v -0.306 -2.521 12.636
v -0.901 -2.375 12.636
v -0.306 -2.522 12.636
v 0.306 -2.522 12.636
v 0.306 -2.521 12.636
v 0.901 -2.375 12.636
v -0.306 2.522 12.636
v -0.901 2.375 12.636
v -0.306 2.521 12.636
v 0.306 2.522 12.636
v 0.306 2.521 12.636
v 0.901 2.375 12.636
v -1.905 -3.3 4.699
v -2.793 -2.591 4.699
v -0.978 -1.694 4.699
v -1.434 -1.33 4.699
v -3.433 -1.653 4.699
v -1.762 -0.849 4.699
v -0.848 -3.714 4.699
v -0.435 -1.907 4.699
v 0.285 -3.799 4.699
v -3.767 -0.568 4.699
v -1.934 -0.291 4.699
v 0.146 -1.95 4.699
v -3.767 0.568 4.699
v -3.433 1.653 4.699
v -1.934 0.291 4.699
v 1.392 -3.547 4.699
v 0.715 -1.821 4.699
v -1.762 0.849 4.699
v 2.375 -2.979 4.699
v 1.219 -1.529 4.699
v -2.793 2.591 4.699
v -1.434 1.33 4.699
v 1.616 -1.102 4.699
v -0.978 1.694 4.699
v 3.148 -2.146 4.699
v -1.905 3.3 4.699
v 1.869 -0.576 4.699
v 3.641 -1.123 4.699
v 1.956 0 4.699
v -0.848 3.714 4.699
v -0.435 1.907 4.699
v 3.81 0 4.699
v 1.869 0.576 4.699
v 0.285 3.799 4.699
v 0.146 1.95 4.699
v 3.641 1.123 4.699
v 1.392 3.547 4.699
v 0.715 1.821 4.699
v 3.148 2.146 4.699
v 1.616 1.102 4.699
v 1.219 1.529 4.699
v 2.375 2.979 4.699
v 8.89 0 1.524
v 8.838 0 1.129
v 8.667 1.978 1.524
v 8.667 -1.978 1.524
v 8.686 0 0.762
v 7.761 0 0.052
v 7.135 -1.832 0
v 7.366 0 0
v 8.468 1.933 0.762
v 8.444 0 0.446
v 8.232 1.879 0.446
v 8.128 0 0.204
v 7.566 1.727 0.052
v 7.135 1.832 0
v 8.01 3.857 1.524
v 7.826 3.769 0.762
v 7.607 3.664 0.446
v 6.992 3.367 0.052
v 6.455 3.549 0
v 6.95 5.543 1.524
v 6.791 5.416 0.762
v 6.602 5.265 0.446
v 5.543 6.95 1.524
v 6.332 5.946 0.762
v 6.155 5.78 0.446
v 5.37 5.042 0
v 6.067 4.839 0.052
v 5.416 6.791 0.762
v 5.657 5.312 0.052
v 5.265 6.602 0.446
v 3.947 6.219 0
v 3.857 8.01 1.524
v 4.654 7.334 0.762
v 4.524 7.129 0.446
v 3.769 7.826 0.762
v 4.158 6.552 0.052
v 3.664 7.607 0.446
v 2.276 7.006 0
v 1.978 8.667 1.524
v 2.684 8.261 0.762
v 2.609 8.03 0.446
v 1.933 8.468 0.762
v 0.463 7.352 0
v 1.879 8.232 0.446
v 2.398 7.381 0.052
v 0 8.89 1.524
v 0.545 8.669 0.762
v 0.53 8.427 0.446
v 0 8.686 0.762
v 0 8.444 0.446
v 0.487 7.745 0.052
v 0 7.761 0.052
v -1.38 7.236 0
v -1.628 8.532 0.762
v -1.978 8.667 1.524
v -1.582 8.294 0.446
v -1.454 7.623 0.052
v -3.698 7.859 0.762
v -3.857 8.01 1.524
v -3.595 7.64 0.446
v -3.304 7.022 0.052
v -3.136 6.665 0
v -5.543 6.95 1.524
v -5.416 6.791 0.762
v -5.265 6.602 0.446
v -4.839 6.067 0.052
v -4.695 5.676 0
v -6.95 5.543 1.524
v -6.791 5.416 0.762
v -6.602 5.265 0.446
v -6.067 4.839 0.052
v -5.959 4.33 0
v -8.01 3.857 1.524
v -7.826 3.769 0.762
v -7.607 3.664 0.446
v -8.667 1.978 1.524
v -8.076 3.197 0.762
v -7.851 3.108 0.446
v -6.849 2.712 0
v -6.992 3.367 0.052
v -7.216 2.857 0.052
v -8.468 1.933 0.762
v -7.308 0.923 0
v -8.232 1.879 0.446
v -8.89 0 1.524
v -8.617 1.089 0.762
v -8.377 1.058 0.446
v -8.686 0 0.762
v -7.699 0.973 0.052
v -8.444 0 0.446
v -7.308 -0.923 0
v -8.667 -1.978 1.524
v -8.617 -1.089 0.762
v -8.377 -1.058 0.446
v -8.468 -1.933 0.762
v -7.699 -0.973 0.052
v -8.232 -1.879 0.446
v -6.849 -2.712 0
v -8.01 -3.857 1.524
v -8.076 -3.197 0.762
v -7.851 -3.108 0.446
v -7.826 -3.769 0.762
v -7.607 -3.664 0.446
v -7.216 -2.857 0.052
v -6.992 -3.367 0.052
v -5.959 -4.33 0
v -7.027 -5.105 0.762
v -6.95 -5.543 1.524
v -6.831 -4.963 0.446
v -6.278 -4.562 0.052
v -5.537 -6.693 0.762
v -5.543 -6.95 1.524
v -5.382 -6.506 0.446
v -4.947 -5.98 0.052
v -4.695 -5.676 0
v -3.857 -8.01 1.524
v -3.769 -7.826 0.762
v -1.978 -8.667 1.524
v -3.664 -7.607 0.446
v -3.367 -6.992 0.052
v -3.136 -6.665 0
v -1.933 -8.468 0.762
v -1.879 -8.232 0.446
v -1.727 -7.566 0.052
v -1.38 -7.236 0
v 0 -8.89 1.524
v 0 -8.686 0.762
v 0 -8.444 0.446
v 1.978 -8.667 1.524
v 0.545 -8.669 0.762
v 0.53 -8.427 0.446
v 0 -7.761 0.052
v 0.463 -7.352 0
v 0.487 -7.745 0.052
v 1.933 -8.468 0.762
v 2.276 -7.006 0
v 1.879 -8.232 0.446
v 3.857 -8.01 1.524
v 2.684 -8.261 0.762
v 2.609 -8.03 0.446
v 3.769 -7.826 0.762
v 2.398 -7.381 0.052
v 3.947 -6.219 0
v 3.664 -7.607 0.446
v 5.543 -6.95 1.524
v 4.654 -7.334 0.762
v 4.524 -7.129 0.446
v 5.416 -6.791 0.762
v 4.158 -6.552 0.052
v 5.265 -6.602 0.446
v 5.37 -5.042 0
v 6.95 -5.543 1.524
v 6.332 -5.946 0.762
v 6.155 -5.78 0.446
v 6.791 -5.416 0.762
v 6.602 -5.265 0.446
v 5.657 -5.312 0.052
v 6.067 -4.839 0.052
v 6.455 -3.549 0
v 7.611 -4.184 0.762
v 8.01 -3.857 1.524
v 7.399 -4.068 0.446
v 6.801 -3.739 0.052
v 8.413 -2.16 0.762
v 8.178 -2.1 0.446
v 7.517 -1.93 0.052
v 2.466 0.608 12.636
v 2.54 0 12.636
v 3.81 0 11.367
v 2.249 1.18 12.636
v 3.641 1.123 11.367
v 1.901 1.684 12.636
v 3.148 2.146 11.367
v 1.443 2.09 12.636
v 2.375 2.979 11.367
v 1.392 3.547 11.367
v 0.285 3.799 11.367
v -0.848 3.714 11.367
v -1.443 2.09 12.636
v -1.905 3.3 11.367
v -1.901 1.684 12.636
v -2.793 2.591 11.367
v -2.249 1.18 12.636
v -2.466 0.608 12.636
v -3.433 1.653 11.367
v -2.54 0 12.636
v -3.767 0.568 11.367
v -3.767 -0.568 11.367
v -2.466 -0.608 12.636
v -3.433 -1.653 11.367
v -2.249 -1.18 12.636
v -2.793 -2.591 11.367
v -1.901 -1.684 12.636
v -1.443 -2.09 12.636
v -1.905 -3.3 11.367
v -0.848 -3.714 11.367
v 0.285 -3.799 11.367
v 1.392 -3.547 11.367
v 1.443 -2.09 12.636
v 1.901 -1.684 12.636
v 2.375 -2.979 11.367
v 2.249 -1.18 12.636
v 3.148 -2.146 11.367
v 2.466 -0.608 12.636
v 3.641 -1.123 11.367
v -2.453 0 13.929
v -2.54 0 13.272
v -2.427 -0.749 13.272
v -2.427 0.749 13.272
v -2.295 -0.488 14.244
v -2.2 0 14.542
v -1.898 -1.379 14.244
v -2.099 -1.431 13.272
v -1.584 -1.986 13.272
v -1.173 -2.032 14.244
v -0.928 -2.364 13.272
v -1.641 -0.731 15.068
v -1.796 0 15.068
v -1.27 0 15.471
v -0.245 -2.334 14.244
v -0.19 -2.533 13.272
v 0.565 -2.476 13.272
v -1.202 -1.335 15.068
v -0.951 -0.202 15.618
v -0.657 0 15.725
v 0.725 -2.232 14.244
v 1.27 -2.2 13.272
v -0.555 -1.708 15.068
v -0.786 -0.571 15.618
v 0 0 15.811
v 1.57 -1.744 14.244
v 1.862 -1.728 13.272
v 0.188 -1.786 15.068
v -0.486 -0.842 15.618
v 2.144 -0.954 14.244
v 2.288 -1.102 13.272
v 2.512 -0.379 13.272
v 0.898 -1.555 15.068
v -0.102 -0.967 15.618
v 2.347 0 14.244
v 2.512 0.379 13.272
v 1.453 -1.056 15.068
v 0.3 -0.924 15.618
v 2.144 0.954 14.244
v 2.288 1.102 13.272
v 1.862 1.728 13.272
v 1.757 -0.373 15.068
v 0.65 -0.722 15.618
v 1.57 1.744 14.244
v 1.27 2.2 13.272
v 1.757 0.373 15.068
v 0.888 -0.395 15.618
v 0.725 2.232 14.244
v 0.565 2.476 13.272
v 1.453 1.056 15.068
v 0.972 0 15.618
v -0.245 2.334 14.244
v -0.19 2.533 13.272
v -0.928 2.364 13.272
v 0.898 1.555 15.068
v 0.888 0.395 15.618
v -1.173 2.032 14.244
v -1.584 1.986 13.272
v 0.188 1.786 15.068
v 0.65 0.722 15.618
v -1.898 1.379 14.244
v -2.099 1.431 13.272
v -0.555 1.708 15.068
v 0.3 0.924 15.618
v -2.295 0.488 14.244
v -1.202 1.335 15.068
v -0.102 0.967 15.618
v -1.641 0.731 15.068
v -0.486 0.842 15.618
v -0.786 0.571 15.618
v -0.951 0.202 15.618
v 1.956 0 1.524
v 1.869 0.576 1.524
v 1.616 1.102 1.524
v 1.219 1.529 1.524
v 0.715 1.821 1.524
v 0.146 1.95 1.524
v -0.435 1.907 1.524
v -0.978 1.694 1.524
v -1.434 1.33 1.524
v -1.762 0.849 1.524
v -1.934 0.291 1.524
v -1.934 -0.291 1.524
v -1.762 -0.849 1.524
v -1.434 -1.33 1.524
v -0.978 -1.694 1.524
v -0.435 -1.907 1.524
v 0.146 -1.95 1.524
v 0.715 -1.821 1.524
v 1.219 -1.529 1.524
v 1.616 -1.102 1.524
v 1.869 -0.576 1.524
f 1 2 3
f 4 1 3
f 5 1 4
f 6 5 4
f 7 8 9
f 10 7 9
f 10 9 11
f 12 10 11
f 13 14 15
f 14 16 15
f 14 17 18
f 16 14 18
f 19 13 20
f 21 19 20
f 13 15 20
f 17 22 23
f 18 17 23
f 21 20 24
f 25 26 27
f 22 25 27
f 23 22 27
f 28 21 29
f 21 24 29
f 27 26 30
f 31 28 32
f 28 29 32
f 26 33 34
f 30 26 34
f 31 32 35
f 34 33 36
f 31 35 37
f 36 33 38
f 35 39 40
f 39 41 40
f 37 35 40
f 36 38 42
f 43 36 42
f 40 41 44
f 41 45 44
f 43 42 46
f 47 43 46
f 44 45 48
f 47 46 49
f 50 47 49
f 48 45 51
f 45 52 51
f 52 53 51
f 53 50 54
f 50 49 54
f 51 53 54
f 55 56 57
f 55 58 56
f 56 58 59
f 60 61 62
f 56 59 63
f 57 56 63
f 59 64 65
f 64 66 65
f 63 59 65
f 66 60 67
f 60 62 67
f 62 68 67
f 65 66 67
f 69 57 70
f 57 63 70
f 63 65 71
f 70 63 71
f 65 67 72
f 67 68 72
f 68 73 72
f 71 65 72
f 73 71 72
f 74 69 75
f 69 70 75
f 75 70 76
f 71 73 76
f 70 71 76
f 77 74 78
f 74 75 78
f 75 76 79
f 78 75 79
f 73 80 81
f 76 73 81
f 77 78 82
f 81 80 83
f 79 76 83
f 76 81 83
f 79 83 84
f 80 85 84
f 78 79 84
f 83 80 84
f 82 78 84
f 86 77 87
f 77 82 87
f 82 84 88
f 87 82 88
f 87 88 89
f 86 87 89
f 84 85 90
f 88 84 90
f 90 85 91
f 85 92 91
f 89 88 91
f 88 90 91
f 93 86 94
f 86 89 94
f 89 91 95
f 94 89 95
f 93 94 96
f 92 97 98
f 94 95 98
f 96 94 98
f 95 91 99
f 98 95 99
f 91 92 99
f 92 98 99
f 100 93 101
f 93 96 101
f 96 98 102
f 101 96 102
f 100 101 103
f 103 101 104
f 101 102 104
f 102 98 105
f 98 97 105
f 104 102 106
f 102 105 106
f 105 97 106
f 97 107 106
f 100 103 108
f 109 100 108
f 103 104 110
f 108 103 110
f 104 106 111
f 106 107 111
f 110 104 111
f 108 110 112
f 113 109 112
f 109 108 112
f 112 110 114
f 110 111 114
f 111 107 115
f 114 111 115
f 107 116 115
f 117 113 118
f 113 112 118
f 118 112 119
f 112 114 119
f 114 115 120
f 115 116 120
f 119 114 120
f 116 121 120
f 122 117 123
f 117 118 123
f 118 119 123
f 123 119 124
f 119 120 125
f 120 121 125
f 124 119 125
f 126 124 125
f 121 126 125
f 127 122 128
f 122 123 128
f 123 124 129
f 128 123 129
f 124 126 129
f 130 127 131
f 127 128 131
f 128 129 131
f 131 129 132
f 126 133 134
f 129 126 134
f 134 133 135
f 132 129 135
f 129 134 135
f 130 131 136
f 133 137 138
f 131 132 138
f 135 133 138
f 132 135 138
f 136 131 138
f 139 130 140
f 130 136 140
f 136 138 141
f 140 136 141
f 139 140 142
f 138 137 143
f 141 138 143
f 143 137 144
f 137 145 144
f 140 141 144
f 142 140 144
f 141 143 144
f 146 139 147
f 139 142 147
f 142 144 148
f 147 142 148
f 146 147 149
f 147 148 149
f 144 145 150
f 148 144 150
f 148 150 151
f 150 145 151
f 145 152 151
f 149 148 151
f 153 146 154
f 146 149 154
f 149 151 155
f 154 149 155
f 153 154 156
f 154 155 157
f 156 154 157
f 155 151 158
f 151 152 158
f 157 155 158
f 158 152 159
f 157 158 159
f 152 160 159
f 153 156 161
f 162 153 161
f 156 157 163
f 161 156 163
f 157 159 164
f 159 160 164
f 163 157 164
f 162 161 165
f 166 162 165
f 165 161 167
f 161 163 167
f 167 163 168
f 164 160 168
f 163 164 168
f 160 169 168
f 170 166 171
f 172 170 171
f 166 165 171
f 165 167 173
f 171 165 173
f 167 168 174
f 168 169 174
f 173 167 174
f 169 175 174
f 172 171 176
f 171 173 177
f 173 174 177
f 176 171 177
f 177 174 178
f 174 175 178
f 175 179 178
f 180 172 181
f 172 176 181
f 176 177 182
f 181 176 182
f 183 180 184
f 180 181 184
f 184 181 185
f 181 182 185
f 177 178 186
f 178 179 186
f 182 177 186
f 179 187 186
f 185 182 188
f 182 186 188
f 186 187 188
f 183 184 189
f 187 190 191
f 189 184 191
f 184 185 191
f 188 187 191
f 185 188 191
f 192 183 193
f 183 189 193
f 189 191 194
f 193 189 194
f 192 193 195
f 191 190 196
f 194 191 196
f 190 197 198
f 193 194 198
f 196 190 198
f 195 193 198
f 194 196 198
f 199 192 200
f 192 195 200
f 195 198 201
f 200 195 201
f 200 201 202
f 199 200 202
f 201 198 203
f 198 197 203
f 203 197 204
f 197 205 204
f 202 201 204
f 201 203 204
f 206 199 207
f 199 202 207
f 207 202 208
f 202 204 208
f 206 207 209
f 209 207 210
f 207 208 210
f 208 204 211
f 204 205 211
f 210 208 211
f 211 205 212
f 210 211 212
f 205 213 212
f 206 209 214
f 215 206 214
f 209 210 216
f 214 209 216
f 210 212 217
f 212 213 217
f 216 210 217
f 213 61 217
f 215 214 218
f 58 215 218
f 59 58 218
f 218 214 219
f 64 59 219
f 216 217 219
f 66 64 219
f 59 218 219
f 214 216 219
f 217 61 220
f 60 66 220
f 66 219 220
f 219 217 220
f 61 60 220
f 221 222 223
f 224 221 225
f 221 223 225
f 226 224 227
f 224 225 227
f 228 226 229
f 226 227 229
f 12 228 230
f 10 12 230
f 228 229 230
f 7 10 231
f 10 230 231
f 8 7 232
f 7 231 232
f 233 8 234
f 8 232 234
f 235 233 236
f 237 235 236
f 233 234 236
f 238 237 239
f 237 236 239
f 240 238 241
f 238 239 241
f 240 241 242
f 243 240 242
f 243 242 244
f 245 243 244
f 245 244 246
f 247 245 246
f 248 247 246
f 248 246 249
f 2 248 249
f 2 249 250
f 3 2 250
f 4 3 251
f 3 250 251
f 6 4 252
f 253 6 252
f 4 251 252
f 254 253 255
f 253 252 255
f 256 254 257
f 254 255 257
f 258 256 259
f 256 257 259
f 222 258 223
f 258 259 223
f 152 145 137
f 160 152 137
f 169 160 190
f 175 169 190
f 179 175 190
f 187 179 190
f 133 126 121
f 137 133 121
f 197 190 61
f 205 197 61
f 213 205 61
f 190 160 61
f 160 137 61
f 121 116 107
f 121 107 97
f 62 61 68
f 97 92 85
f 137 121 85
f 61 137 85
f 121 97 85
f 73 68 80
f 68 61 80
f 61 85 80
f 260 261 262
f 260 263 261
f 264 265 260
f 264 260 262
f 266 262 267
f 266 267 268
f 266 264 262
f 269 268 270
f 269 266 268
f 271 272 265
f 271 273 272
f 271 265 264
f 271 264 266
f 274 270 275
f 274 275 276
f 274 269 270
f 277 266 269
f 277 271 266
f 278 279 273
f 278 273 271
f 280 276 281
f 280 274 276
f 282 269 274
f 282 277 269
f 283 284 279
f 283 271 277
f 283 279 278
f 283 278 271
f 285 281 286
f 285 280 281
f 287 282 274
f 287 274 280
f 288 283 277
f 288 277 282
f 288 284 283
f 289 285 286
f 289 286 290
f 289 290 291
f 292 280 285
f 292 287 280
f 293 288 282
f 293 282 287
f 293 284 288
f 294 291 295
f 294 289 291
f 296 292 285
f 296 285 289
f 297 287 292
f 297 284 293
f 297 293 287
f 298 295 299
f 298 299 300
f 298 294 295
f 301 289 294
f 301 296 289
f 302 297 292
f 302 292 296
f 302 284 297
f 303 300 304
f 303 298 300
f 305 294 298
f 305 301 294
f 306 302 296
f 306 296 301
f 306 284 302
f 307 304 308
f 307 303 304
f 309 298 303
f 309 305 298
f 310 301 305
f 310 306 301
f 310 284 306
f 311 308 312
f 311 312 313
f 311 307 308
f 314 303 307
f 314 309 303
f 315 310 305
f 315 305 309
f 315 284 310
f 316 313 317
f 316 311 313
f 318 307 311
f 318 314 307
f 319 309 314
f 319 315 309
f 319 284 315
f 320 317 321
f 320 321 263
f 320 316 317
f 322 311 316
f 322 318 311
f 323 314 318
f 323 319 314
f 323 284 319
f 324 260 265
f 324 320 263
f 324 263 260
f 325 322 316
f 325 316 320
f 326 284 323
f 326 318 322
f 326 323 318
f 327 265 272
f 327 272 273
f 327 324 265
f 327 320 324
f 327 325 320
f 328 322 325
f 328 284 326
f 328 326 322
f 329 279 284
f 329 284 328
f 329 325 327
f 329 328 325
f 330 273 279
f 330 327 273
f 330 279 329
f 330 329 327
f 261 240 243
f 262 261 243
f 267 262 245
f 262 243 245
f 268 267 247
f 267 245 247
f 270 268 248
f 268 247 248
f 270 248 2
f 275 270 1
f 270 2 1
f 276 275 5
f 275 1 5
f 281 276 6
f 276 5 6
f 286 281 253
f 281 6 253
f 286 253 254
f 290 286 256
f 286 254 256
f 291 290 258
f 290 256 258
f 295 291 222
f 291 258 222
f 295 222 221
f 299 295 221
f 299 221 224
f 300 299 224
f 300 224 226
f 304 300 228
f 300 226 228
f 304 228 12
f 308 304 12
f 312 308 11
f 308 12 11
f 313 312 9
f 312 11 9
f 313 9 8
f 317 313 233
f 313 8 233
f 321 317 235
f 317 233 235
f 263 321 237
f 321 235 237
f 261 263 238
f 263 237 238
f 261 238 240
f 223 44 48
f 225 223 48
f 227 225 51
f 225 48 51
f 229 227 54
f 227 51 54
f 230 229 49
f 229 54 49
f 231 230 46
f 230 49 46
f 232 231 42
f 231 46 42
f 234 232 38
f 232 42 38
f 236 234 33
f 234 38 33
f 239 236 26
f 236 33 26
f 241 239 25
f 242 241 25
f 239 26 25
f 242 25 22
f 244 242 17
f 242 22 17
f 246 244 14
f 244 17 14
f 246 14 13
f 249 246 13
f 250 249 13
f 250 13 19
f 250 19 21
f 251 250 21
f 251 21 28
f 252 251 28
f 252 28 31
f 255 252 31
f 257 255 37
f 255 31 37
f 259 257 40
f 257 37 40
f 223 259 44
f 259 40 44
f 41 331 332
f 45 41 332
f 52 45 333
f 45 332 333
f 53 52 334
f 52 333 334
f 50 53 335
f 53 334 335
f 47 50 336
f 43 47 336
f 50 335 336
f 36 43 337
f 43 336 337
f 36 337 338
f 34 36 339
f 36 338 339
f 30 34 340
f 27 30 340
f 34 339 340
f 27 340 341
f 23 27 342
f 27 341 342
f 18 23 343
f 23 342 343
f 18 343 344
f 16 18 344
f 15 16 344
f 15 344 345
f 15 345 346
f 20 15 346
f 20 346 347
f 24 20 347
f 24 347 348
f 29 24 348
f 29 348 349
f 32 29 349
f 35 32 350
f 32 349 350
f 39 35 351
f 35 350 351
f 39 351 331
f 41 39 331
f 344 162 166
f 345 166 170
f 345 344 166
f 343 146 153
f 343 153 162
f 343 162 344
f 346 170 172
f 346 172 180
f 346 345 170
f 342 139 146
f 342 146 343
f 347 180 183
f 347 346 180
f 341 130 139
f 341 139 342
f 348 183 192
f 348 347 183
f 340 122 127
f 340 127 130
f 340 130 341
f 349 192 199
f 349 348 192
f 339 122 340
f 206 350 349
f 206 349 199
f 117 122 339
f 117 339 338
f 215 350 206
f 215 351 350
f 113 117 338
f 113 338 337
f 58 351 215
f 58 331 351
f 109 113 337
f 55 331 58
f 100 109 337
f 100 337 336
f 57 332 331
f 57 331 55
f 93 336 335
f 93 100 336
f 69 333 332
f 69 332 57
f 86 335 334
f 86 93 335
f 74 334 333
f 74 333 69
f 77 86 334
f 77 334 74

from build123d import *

# Parameters (mm, degrees)
SKETCH1_R      = 8.89
EXTRUDE1_DEPTH = 1.524
SKETCH2_R      = 1.9558
EXTRUDE2_DEPTH = 3.175
SKETCH3_R      = 3.81
EXTRUDE3_DEPTH = 7.9375
SKETCH4_R      = 2.54
EXTRUDE4_DEPTH = 3.175
FILLET1_R      = 2.54
CHAMFER4_SIZE  = 1.27
FILLET2_R      = 1.524


with BuildPart() as part:
    # Sketch1 → Extrude1 (new body)
    with BuildSketch(Plane.XY):
        Circle(SKETCH1_R)
    extrude(amount=EXTRUDE1_DEPTH)

    # Sketch2 → Extrude2 (add)
    with BuildSketch(Plane.XY.offset(1.524)):
        Circle(SKETCH2_R)
    extrude(amount=EXTRUDE2_DEPTH)

    # Sketch3 → Extrude3 (add)
    with BuildSketch(Plane.XY.offset(4.699)):
        Circle(SKETCH3_R)
    extrude(amount=EXTRUDE3_DEPTH)

    # Sketch4 → Extrude4 (add)
    with BuildSketch(Plane.XY.offset(12.6365)):
        with Locations(Location((0, 0, 0), (0, 0, 180))):
            Circle(SKETCH4_R)
    extrude(amount=EXTRUDE4_DEPTH)

    # Fillet1
    fillet1_edges = [part.edges().sort_by_distance(p)[0] for p in [
        (2.54, 0, 15.8115),
    ]]
    fillet(fillet1_edges, radius=FILLET1_R)

    # Chamfer4
    chamfer4_edges = [part.edges().sort_by_distance(p)[0] for p in [
        (-3.81, 0, 12.6365),
    ]]
    chamfer(chamfer4_edges, length=CHAMFER4_SIZE - 0.0001)  # a hair under: the kernel refuses the full size

    # Fillet2
    fillet2_edges = [part.edges().sort_by_distance(p)[0] for p in [
        (-8.89, 0, 0),
    ]]
    fillet(fillet2_edges, radius=FILLET2_R - 0.0001)  # a hair under: the kernel refuses the full size


solid = part.part
